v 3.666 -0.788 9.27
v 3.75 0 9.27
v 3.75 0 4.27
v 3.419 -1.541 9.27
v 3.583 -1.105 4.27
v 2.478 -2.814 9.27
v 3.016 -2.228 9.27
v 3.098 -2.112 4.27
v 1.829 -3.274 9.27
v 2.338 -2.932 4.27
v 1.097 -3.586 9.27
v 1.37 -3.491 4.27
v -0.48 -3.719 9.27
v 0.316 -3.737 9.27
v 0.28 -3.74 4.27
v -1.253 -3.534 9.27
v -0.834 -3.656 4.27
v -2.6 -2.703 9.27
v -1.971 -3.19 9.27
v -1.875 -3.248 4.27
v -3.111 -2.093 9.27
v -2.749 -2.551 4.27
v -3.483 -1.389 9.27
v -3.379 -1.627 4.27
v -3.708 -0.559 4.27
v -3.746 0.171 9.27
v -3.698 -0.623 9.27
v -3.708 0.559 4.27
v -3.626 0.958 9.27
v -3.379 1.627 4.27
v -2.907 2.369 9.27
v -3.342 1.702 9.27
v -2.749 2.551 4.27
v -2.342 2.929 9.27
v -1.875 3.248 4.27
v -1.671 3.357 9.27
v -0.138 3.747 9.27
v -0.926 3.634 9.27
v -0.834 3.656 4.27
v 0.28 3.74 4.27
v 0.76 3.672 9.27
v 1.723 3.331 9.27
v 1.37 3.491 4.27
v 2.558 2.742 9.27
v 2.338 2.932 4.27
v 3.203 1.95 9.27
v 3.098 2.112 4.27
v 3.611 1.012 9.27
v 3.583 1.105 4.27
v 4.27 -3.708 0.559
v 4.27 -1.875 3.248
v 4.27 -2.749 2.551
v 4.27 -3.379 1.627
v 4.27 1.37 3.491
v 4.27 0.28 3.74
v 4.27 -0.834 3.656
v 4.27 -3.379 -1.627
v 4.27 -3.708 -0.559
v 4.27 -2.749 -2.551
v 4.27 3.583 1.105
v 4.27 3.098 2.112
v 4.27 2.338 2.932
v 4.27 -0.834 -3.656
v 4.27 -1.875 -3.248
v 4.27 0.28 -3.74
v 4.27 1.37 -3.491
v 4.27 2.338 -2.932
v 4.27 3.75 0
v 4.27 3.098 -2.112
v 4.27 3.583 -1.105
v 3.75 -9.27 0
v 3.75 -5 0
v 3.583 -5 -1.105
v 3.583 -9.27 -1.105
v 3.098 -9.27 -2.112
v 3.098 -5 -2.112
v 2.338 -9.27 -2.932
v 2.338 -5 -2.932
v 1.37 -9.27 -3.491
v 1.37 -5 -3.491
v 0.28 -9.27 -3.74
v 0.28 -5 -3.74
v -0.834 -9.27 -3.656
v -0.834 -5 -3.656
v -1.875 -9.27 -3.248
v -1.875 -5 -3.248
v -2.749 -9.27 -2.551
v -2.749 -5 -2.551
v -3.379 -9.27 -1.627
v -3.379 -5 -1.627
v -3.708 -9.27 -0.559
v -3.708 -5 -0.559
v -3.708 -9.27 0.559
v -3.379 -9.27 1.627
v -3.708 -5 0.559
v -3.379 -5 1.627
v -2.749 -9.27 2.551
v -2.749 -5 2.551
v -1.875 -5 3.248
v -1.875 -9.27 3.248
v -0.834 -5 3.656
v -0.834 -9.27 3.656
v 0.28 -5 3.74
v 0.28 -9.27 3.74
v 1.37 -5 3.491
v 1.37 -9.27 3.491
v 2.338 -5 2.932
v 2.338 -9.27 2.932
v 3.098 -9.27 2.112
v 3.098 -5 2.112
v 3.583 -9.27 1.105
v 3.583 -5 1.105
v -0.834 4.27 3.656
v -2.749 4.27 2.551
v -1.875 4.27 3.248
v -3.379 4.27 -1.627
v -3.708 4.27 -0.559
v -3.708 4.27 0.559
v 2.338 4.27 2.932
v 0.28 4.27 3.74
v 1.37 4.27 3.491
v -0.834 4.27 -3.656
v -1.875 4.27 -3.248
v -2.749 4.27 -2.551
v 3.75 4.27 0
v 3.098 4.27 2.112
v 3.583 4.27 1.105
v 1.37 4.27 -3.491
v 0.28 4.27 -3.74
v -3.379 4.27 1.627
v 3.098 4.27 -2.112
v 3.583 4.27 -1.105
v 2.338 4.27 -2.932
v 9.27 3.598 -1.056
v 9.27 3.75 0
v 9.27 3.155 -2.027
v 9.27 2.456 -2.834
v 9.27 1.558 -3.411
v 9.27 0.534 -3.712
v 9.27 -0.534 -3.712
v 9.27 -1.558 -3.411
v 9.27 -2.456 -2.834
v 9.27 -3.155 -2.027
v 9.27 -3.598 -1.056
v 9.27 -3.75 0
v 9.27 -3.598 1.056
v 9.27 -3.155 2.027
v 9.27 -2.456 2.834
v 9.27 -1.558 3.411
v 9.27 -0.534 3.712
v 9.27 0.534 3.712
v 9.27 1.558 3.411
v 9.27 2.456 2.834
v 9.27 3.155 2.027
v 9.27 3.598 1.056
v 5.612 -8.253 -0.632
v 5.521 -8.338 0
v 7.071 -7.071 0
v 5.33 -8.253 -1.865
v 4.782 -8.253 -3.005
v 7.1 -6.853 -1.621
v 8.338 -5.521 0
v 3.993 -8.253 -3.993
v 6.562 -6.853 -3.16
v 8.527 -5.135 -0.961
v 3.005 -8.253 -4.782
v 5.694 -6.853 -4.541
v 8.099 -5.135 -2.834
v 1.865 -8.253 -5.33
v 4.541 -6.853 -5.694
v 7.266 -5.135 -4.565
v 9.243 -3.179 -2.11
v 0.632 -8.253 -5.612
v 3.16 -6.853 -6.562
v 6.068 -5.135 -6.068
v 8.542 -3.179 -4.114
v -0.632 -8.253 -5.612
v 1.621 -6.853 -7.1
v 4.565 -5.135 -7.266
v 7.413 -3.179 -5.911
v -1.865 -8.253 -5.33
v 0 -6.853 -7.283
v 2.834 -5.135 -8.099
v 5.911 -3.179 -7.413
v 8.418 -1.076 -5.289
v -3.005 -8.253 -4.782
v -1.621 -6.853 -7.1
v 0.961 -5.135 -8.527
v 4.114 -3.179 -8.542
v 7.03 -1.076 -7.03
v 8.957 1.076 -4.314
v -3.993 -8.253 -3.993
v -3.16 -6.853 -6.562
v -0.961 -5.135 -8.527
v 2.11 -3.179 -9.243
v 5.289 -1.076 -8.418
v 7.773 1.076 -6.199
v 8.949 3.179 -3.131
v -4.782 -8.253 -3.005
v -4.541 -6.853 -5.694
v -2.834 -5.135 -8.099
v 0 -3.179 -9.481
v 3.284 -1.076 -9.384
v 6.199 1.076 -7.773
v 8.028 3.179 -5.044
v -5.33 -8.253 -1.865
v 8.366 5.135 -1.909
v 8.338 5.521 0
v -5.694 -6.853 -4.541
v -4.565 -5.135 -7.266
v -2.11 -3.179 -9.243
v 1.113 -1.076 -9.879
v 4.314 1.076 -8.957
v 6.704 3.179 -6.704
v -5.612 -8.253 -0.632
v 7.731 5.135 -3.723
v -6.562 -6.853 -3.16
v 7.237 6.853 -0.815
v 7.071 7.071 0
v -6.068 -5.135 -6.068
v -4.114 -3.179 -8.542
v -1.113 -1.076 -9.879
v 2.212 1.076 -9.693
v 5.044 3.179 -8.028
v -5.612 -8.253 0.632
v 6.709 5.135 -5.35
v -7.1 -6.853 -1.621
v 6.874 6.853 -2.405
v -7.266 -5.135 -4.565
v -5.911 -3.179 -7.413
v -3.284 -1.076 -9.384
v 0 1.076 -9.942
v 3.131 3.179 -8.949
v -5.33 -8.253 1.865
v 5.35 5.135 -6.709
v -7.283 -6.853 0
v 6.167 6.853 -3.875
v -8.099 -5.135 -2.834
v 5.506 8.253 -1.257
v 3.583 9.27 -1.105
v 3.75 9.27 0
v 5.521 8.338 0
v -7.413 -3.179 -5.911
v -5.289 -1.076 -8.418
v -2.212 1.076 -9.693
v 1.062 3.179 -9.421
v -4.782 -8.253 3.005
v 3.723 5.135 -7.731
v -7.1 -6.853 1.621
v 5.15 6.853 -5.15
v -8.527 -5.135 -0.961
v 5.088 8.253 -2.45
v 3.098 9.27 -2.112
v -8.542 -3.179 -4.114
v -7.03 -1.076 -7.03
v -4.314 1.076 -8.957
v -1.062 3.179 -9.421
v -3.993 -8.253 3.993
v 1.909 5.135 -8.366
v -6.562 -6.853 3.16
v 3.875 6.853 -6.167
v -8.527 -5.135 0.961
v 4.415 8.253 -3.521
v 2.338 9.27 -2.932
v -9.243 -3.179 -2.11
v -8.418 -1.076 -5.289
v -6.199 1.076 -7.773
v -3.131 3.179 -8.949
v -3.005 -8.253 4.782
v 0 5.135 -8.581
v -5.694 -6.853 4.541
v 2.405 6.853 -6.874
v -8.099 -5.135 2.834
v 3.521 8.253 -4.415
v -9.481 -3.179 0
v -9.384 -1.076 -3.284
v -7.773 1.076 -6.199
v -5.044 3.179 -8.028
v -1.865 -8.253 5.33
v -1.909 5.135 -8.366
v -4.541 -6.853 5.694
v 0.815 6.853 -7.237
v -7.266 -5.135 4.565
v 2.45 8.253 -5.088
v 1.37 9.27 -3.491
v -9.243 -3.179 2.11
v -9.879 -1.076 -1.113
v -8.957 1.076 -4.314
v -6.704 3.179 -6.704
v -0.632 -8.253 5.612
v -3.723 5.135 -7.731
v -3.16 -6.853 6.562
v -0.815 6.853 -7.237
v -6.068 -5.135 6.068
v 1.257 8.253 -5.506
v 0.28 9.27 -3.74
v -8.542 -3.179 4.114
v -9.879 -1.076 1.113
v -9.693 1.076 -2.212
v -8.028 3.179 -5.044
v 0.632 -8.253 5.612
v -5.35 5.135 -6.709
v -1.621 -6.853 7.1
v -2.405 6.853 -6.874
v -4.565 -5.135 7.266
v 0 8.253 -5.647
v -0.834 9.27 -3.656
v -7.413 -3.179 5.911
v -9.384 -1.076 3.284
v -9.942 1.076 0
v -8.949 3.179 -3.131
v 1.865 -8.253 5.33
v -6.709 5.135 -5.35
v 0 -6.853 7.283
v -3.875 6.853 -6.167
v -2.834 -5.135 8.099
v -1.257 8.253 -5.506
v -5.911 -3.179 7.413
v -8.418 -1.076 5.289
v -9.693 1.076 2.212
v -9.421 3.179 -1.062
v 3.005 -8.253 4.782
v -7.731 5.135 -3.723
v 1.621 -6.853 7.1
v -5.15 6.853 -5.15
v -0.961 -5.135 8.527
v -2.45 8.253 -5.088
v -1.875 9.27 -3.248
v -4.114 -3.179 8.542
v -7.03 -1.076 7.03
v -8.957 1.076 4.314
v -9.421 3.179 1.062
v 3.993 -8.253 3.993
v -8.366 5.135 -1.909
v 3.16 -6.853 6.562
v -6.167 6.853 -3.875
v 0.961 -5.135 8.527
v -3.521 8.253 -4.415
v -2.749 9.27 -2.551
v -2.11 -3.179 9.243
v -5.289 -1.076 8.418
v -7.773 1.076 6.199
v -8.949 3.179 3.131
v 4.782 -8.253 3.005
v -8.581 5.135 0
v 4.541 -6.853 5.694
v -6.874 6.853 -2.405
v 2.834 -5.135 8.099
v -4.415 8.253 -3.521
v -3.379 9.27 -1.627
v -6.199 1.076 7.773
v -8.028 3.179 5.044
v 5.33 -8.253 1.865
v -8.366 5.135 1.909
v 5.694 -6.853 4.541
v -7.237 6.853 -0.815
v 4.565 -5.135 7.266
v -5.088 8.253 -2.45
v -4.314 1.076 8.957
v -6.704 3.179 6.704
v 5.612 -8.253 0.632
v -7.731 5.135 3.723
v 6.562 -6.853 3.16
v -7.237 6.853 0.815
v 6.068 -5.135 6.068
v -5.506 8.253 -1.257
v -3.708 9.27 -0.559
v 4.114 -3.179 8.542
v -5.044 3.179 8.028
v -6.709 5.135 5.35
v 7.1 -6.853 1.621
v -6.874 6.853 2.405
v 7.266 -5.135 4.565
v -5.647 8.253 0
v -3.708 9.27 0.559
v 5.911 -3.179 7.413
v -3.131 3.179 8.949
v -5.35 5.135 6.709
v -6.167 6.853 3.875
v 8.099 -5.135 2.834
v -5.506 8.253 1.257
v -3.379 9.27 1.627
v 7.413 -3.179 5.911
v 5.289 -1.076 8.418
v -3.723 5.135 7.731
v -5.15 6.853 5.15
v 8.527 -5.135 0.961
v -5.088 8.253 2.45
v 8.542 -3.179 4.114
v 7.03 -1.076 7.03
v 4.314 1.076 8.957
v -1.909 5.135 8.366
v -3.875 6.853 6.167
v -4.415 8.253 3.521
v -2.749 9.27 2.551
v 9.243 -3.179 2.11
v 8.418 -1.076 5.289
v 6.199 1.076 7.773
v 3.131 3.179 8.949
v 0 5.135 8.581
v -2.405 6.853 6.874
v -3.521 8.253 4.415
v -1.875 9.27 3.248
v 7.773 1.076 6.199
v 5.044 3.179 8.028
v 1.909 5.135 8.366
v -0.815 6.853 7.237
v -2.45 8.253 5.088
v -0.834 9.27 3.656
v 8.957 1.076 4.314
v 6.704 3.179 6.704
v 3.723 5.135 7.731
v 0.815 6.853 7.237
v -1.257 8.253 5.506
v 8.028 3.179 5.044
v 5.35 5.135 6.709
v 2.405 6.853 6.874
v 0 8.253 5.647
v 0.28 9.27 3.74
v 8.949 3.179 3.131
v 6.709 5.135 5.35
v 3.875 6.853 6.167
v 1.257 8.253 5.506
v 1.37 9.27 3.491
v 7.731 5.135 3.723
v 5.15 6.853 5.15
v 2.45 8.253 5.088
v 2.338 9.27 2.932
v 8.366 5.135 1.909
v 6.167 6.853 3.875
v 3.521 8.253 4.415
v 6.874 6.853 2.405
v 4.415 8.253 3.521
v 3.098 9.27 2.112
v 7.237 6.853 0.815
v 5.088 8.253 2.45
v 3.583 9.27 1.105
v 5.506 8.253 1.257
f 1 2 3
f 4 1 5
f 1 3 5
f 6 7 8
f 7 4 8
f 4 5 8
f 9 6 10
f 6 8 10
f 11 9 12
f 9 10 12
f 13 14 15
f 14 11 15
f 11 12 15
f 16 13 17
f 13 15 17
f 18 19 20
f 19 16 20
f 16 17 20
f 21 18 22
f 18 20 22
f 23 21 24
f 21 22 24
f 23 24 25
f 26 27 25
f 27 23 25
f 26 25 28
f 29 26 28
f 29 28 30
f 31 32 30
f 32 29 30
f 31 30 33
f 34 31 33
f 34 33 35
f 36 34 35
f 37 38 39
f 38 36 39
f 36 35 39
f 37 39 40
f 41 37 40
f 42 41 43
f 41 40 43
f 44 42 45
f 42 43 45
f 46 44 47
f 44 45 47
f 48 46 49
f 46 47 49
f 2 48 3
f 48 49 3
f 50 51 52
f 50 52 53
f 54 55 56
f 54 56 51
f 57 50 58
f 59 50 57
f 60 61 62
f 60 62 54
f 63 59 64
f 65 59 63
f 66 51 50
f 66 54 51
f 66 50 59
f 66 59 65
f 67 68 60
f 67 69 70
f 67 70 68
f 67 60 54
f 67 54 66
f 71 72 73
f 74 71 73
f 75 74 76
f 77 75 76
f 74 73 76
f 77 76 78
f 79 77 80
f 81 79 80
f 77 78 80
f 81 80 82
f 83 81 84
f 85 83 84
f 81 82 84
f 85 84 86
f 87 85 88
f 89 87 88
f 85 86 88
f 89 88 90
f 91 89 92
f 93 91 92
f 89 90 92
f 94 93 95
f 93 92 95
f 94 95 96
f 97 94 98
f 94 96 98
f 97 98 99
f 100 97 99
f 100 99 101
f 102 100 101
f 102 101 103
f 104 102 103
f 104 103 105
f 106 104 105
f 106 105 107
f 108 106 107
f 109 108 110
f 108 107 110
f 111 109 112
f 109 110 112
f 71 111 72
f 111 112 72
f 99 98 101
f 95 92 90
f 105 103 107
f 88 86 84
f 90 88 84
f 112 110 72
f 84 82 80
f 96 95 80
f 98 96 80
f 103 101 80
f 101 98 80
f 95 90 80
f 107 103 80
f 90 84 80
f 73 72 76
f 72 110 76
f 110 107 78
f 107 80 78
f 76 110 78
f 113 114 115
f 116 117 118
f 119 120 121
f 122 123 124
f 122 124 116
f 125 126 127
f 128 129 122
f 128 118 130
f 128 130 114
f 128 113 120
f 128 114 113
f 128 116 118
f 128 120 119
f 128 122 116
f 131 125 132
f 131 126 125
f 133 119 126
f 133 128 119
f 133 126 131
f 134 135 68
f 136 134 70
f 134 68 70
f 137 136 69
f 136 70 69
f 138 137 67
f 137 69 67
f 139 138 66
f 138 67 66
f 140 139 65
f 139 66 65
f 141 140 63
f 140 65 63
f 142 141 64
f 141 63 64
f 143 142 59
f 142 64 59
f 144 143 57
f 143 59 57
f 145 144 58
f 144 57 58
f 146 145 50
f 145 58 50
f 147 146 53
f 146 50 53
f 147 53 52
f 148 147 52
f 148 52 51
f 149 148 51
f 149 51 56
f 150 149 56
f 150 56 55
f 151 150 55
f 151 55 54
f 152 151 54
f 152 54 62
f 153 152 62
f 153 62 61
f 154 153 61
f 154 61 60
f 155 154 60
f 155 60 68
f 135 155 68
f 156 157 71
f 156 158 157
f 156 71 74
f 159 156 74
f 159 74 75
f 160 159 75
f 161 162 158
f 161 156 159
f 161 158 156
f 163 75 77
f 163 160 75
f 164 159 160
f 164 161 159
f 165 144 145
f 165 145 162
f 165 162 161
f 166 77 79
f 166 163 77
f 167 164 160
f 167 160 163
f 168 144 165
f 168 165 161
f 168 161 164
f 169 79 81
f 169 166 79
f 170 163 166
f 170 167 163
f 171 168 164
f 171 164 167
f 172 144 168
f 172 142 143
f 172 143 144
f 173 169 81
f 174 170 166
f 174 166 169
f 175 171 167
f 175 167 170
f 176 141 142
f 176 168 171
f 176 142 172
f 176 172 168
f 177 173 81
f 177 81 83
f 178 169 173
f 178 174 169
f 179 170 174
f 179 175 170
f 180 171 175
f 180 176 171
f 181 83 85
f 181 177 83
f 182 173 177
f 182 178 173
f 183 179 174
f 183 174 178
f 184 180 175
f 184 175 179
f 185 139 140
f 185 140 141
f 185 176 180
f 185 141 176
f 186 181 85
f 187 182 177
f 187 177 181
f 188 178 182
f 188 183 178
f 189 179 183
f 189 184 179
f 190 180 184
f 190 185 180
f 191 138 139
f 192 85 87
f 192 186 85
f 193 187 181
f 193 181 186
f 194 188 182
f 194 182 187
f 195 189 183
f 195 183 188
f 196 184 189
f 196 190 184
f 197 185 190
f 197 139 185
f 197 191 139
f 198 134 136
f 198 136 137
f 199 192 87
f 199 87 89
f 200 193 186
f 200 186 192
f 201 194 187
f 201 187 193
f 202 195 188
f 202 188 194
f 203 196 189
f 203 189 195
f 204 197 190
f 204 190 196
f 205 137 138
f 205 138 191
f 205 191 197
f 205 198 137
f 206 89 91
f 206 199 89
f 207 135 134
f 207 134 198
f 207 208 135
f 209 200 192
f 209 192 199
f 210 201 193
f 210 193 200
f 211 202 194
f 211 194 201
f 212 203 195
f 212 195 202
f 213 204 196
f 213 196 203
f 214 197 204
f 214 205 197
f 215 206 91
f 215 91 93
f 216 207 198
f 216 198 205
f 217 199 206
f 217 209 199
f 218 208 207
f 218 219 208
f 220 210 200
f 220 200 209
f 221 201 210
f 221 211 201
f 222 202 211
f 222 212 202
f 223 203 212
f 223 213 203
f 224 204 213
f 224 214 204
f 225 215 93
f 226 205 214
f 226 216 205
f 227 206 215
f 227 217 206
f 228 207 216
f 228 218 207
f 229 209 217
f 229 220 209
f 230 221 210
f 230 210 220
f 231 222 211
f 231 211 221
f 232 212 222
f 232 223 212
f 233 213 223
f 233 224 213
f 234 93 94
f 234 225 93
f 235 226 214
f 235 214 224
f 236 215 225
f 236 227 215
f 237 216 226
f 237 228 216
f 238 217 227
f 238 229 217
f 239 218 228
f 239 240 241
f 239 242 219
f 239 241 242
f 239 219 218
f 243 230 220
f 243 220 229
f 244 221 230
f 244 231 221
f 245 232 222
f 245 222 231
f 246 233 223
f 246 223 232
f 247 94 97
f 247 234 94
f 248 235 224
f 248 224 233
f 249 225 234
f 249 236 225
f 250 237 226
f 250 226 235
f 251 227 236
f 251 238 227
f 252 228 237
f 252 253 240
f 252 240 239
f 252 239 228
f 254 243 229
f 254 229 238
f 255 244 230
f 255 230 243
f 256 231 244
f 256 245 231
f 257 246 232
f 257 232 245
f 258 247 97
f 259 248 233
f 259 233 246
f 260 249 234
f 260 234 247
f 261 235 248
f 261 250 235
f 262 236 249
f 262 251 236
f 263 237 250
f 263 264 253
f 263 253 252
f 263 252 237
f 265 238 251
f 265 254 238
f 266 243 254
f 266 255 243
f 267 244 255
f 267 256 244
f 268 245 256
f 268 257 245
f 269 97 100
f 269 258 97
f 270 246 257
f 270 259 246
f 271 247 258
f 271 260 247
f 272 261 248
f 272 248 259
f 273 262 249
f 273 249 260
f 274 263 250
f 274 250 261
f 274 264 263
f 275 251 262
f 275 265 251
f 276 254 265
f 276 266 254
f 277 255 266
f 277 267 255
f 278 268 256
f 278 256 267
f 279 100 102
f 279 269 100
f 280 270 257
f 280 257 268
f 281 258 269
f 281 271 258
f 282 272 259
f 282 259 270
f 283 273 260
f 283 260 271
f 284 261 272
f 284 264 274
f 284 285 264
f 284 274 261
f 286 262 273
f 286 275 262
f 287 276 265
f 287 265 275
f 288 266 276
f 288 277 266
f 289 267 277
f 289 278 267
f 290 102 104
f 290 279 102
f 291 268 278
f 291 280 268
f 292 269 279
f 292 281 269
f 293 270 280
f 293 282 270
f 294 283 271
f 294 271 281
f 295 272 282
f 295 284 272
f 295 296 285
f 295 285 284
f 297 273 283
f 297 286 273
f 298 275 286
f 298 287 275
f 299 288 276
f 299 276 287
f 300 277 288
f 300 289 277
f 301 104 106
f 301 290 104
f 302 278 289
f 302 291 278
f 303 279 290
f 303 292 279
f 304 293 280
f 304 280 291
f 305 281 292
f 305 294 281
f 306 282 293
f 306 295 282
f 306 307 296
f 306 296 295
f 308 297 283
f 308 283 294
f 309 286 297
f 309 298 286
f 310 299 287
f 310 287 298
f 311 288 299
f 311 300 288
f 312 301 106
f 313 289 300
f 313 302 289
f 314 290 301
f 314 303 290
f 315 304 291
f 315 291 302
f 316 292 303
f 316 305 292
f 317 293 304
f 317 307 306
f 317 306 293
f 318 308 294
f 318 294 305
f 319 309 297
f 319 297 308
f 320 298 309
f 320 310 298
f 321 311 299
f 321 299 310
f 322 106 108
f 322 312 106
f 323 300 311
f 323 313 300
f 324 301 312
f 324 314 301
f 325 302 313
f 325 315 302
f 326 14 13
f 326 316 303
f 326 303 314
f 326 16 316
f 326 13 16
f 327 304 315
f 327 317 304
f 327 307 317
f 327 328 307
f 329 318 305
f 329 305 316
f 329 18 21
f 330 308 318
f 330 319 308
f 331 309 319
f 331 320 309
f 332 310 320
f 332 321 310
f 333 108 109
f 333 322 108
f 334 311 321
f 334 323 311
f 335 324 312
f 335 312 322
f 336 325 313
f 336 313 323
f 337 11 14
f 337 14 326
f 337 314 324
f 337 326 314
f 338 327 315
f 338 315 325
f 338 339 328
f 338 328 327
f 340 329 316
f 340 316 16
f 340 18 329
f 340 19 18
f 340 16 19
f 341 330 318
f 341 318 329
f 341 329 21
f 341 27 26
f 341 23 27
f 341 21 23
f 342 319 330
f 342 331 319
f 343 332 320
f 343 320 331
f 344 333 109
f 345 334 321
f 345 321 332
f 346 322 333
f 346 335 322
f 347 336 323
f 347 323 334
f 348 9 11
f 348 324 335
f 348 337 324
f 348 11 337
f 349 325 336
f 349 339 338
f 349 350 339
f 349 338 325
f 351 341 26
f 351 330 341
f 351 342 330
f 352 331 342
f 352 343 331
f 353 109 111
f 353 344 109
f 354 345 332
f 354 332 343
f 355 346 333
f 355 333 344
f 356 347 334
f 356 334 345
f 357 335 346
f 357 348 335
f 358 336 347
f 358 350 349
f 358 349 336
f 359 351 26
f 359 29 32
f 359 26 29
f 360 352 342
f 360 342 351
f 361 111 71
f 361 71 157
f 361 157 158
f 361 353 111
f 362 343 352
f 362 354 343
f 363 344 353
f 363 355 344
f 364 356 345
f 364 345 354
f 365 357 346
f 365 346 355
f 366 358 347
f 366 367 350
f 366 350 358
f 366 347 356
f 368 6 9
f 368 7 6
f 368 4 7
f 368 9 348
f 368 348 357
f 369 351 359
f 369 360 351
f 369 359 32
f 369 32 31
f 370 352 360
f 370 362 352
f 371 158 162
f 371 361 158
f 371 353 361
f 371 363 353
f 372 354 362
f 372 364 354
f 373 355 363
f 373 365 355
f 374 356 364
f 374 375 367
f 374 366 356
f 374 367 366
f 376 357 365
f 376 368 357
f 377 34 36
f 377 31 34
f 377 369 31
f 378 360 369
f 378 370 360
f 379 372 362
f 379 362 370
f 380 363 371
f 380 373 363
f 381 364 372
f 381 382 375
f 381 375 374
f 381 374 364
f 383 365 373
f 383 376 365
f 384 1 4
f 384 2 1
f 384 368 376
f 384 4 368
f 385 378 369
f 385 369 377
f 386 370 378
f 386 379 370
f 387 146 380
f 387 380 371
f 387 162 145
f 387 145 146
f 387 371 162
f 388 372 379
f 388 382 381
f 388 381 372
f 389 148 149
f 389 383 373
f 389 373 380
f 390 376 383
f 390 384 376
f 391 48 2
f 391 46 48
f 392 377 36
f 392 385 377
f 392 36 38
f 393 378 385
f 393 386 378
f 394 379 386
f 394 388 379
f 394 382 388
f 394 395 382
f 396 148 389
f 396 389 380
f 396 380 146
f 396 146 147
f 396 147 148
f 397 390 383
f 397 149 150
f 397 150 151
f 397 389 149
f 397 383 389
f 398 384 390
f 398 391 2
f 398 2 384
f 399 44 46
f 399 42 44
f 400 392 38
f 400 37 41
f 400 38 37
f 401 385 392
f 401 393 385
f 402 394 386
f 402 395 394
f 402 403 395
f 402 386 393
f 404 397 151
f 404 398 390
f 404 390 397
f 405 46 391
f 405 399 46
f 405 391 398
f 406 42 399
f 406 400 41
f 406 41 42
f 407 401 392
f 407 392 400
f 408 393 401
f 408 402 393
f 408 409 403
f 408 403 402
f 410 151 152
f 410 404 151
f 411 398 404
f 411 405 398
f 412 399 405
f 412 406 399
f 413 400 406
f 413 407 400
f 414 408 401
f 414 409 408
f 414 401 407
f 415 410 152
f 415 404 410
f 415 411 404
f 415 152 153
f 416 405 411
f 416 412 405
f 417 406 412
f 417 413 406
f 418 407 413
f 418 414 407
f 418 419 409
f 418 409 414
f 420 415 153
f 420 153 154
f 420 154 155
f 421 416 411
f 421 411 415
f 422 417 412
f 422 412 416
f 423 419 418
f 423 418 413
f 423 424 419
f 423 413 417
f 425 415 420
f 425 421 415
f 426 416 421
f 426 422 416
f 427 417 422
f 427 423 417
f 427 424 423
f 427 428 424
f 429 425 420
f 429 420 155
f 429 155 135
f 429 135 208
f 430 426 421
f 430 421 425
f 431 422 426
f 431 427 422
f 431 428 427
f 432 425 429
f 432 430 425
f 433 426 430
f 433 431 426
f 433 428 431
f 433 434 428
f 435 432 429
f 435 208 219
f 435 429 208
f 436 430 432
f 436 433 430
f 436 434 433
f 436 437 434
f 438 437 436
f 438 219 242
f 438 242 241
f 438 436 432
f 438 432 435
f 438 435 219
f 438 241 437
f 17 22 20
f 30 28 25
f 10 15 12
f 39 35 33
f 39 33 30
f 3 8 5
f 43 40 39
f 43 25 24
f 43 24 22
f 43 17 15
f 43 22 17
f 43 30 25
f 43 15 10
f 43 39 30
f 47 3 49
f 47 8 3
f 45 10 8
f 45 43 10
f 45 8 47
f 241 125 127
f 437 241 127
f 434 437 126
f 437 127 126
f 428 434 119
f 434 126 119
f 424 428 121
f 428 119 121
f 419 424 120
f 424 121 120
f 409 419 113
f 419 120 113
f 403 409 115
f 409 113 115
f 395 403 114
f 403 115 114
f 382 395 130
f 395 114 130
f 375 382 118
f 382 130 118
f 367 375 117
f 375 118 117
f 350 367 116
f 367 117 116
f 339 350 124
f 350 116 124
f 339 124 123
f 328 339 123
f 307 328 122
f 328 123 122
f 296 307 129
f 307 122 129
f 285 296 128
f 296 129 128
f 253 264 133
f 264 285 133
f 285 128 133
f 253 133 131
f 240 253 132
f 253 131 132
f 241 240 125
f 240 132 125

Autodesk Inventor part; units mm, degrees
ref_plane "YZ Plane" through (0, 0, 0) normal (1, 0, 0) x (0, 1, 0)
ref_plane "XZ Plane" through (0, 0, 0) normal (0, 1, 0) x (-1, 0, 0)
ref_plane "XY Plane" through (0, 0, 0) normal (0, 0, 1) x (1, 0, 0)
sketch "Sketch1" plane through (0, 0, 0) normal (0, 0, 1) x (1, 0, 0)
  line L0 (0, -5) -> (0, 4.2702)
  line L1 (3.75, -9.2702) -> (3.75, -5)
  line L2 (3.75, -5) -> (0, -5)
  line L3 (3.75, 9.2702) -> (3.75, 4.2702)
  line L4 (3.75, 4.2702) -> (0, 4.2702)
  arc A0 (3.75, -9.2702) -> (3.75, 9.2702) centre (0, 0) ccw
  dimension "d4" = 5
  dimension "d9" = 20
revolve "Revolution1" add sketch "Sketch1" angle 360 about axis through (0, -5, 0) along (0, 1, 0)
sketch "Sketch2" plane through (0, 0, 0) normal (1, 0, 0) x (0, 1, 0)
  circle A0 centre (0, 0) radius 3.75
  dimension "d11" = 7.5
extrude "Extrusion1" cut sketch "Sketch2" along normal blind 10
sketch "Sketch3" plane through (0, 0, 0) normal (1, 0, 0) x (0, 0, -1)
  circle A0 centre (0, 0) radius 3.75
extrude "Extrusion2" add sketch "Sketch3" along normal blind 4.27
sketch "Sketch4" plane through (0, 0, 0) normal (0, 0, 1) x (1, 0, 0)
  circle A0 centre (0, 0) radius 3.75
  dimension "d16" = 7.5
extrude "Extrusion3" cut sketch "Sketch4" along normal blind 10
sketch "Sketch5" plane through (0, 0, 0) normal (0, 0, 1) x (1, 0, 0)
  circle A0 centre (0, 0) radius 3.75
extrude "Extrusion4" add sketch "Sketch5" along normal blind 4.27
properties part number "Base2"
